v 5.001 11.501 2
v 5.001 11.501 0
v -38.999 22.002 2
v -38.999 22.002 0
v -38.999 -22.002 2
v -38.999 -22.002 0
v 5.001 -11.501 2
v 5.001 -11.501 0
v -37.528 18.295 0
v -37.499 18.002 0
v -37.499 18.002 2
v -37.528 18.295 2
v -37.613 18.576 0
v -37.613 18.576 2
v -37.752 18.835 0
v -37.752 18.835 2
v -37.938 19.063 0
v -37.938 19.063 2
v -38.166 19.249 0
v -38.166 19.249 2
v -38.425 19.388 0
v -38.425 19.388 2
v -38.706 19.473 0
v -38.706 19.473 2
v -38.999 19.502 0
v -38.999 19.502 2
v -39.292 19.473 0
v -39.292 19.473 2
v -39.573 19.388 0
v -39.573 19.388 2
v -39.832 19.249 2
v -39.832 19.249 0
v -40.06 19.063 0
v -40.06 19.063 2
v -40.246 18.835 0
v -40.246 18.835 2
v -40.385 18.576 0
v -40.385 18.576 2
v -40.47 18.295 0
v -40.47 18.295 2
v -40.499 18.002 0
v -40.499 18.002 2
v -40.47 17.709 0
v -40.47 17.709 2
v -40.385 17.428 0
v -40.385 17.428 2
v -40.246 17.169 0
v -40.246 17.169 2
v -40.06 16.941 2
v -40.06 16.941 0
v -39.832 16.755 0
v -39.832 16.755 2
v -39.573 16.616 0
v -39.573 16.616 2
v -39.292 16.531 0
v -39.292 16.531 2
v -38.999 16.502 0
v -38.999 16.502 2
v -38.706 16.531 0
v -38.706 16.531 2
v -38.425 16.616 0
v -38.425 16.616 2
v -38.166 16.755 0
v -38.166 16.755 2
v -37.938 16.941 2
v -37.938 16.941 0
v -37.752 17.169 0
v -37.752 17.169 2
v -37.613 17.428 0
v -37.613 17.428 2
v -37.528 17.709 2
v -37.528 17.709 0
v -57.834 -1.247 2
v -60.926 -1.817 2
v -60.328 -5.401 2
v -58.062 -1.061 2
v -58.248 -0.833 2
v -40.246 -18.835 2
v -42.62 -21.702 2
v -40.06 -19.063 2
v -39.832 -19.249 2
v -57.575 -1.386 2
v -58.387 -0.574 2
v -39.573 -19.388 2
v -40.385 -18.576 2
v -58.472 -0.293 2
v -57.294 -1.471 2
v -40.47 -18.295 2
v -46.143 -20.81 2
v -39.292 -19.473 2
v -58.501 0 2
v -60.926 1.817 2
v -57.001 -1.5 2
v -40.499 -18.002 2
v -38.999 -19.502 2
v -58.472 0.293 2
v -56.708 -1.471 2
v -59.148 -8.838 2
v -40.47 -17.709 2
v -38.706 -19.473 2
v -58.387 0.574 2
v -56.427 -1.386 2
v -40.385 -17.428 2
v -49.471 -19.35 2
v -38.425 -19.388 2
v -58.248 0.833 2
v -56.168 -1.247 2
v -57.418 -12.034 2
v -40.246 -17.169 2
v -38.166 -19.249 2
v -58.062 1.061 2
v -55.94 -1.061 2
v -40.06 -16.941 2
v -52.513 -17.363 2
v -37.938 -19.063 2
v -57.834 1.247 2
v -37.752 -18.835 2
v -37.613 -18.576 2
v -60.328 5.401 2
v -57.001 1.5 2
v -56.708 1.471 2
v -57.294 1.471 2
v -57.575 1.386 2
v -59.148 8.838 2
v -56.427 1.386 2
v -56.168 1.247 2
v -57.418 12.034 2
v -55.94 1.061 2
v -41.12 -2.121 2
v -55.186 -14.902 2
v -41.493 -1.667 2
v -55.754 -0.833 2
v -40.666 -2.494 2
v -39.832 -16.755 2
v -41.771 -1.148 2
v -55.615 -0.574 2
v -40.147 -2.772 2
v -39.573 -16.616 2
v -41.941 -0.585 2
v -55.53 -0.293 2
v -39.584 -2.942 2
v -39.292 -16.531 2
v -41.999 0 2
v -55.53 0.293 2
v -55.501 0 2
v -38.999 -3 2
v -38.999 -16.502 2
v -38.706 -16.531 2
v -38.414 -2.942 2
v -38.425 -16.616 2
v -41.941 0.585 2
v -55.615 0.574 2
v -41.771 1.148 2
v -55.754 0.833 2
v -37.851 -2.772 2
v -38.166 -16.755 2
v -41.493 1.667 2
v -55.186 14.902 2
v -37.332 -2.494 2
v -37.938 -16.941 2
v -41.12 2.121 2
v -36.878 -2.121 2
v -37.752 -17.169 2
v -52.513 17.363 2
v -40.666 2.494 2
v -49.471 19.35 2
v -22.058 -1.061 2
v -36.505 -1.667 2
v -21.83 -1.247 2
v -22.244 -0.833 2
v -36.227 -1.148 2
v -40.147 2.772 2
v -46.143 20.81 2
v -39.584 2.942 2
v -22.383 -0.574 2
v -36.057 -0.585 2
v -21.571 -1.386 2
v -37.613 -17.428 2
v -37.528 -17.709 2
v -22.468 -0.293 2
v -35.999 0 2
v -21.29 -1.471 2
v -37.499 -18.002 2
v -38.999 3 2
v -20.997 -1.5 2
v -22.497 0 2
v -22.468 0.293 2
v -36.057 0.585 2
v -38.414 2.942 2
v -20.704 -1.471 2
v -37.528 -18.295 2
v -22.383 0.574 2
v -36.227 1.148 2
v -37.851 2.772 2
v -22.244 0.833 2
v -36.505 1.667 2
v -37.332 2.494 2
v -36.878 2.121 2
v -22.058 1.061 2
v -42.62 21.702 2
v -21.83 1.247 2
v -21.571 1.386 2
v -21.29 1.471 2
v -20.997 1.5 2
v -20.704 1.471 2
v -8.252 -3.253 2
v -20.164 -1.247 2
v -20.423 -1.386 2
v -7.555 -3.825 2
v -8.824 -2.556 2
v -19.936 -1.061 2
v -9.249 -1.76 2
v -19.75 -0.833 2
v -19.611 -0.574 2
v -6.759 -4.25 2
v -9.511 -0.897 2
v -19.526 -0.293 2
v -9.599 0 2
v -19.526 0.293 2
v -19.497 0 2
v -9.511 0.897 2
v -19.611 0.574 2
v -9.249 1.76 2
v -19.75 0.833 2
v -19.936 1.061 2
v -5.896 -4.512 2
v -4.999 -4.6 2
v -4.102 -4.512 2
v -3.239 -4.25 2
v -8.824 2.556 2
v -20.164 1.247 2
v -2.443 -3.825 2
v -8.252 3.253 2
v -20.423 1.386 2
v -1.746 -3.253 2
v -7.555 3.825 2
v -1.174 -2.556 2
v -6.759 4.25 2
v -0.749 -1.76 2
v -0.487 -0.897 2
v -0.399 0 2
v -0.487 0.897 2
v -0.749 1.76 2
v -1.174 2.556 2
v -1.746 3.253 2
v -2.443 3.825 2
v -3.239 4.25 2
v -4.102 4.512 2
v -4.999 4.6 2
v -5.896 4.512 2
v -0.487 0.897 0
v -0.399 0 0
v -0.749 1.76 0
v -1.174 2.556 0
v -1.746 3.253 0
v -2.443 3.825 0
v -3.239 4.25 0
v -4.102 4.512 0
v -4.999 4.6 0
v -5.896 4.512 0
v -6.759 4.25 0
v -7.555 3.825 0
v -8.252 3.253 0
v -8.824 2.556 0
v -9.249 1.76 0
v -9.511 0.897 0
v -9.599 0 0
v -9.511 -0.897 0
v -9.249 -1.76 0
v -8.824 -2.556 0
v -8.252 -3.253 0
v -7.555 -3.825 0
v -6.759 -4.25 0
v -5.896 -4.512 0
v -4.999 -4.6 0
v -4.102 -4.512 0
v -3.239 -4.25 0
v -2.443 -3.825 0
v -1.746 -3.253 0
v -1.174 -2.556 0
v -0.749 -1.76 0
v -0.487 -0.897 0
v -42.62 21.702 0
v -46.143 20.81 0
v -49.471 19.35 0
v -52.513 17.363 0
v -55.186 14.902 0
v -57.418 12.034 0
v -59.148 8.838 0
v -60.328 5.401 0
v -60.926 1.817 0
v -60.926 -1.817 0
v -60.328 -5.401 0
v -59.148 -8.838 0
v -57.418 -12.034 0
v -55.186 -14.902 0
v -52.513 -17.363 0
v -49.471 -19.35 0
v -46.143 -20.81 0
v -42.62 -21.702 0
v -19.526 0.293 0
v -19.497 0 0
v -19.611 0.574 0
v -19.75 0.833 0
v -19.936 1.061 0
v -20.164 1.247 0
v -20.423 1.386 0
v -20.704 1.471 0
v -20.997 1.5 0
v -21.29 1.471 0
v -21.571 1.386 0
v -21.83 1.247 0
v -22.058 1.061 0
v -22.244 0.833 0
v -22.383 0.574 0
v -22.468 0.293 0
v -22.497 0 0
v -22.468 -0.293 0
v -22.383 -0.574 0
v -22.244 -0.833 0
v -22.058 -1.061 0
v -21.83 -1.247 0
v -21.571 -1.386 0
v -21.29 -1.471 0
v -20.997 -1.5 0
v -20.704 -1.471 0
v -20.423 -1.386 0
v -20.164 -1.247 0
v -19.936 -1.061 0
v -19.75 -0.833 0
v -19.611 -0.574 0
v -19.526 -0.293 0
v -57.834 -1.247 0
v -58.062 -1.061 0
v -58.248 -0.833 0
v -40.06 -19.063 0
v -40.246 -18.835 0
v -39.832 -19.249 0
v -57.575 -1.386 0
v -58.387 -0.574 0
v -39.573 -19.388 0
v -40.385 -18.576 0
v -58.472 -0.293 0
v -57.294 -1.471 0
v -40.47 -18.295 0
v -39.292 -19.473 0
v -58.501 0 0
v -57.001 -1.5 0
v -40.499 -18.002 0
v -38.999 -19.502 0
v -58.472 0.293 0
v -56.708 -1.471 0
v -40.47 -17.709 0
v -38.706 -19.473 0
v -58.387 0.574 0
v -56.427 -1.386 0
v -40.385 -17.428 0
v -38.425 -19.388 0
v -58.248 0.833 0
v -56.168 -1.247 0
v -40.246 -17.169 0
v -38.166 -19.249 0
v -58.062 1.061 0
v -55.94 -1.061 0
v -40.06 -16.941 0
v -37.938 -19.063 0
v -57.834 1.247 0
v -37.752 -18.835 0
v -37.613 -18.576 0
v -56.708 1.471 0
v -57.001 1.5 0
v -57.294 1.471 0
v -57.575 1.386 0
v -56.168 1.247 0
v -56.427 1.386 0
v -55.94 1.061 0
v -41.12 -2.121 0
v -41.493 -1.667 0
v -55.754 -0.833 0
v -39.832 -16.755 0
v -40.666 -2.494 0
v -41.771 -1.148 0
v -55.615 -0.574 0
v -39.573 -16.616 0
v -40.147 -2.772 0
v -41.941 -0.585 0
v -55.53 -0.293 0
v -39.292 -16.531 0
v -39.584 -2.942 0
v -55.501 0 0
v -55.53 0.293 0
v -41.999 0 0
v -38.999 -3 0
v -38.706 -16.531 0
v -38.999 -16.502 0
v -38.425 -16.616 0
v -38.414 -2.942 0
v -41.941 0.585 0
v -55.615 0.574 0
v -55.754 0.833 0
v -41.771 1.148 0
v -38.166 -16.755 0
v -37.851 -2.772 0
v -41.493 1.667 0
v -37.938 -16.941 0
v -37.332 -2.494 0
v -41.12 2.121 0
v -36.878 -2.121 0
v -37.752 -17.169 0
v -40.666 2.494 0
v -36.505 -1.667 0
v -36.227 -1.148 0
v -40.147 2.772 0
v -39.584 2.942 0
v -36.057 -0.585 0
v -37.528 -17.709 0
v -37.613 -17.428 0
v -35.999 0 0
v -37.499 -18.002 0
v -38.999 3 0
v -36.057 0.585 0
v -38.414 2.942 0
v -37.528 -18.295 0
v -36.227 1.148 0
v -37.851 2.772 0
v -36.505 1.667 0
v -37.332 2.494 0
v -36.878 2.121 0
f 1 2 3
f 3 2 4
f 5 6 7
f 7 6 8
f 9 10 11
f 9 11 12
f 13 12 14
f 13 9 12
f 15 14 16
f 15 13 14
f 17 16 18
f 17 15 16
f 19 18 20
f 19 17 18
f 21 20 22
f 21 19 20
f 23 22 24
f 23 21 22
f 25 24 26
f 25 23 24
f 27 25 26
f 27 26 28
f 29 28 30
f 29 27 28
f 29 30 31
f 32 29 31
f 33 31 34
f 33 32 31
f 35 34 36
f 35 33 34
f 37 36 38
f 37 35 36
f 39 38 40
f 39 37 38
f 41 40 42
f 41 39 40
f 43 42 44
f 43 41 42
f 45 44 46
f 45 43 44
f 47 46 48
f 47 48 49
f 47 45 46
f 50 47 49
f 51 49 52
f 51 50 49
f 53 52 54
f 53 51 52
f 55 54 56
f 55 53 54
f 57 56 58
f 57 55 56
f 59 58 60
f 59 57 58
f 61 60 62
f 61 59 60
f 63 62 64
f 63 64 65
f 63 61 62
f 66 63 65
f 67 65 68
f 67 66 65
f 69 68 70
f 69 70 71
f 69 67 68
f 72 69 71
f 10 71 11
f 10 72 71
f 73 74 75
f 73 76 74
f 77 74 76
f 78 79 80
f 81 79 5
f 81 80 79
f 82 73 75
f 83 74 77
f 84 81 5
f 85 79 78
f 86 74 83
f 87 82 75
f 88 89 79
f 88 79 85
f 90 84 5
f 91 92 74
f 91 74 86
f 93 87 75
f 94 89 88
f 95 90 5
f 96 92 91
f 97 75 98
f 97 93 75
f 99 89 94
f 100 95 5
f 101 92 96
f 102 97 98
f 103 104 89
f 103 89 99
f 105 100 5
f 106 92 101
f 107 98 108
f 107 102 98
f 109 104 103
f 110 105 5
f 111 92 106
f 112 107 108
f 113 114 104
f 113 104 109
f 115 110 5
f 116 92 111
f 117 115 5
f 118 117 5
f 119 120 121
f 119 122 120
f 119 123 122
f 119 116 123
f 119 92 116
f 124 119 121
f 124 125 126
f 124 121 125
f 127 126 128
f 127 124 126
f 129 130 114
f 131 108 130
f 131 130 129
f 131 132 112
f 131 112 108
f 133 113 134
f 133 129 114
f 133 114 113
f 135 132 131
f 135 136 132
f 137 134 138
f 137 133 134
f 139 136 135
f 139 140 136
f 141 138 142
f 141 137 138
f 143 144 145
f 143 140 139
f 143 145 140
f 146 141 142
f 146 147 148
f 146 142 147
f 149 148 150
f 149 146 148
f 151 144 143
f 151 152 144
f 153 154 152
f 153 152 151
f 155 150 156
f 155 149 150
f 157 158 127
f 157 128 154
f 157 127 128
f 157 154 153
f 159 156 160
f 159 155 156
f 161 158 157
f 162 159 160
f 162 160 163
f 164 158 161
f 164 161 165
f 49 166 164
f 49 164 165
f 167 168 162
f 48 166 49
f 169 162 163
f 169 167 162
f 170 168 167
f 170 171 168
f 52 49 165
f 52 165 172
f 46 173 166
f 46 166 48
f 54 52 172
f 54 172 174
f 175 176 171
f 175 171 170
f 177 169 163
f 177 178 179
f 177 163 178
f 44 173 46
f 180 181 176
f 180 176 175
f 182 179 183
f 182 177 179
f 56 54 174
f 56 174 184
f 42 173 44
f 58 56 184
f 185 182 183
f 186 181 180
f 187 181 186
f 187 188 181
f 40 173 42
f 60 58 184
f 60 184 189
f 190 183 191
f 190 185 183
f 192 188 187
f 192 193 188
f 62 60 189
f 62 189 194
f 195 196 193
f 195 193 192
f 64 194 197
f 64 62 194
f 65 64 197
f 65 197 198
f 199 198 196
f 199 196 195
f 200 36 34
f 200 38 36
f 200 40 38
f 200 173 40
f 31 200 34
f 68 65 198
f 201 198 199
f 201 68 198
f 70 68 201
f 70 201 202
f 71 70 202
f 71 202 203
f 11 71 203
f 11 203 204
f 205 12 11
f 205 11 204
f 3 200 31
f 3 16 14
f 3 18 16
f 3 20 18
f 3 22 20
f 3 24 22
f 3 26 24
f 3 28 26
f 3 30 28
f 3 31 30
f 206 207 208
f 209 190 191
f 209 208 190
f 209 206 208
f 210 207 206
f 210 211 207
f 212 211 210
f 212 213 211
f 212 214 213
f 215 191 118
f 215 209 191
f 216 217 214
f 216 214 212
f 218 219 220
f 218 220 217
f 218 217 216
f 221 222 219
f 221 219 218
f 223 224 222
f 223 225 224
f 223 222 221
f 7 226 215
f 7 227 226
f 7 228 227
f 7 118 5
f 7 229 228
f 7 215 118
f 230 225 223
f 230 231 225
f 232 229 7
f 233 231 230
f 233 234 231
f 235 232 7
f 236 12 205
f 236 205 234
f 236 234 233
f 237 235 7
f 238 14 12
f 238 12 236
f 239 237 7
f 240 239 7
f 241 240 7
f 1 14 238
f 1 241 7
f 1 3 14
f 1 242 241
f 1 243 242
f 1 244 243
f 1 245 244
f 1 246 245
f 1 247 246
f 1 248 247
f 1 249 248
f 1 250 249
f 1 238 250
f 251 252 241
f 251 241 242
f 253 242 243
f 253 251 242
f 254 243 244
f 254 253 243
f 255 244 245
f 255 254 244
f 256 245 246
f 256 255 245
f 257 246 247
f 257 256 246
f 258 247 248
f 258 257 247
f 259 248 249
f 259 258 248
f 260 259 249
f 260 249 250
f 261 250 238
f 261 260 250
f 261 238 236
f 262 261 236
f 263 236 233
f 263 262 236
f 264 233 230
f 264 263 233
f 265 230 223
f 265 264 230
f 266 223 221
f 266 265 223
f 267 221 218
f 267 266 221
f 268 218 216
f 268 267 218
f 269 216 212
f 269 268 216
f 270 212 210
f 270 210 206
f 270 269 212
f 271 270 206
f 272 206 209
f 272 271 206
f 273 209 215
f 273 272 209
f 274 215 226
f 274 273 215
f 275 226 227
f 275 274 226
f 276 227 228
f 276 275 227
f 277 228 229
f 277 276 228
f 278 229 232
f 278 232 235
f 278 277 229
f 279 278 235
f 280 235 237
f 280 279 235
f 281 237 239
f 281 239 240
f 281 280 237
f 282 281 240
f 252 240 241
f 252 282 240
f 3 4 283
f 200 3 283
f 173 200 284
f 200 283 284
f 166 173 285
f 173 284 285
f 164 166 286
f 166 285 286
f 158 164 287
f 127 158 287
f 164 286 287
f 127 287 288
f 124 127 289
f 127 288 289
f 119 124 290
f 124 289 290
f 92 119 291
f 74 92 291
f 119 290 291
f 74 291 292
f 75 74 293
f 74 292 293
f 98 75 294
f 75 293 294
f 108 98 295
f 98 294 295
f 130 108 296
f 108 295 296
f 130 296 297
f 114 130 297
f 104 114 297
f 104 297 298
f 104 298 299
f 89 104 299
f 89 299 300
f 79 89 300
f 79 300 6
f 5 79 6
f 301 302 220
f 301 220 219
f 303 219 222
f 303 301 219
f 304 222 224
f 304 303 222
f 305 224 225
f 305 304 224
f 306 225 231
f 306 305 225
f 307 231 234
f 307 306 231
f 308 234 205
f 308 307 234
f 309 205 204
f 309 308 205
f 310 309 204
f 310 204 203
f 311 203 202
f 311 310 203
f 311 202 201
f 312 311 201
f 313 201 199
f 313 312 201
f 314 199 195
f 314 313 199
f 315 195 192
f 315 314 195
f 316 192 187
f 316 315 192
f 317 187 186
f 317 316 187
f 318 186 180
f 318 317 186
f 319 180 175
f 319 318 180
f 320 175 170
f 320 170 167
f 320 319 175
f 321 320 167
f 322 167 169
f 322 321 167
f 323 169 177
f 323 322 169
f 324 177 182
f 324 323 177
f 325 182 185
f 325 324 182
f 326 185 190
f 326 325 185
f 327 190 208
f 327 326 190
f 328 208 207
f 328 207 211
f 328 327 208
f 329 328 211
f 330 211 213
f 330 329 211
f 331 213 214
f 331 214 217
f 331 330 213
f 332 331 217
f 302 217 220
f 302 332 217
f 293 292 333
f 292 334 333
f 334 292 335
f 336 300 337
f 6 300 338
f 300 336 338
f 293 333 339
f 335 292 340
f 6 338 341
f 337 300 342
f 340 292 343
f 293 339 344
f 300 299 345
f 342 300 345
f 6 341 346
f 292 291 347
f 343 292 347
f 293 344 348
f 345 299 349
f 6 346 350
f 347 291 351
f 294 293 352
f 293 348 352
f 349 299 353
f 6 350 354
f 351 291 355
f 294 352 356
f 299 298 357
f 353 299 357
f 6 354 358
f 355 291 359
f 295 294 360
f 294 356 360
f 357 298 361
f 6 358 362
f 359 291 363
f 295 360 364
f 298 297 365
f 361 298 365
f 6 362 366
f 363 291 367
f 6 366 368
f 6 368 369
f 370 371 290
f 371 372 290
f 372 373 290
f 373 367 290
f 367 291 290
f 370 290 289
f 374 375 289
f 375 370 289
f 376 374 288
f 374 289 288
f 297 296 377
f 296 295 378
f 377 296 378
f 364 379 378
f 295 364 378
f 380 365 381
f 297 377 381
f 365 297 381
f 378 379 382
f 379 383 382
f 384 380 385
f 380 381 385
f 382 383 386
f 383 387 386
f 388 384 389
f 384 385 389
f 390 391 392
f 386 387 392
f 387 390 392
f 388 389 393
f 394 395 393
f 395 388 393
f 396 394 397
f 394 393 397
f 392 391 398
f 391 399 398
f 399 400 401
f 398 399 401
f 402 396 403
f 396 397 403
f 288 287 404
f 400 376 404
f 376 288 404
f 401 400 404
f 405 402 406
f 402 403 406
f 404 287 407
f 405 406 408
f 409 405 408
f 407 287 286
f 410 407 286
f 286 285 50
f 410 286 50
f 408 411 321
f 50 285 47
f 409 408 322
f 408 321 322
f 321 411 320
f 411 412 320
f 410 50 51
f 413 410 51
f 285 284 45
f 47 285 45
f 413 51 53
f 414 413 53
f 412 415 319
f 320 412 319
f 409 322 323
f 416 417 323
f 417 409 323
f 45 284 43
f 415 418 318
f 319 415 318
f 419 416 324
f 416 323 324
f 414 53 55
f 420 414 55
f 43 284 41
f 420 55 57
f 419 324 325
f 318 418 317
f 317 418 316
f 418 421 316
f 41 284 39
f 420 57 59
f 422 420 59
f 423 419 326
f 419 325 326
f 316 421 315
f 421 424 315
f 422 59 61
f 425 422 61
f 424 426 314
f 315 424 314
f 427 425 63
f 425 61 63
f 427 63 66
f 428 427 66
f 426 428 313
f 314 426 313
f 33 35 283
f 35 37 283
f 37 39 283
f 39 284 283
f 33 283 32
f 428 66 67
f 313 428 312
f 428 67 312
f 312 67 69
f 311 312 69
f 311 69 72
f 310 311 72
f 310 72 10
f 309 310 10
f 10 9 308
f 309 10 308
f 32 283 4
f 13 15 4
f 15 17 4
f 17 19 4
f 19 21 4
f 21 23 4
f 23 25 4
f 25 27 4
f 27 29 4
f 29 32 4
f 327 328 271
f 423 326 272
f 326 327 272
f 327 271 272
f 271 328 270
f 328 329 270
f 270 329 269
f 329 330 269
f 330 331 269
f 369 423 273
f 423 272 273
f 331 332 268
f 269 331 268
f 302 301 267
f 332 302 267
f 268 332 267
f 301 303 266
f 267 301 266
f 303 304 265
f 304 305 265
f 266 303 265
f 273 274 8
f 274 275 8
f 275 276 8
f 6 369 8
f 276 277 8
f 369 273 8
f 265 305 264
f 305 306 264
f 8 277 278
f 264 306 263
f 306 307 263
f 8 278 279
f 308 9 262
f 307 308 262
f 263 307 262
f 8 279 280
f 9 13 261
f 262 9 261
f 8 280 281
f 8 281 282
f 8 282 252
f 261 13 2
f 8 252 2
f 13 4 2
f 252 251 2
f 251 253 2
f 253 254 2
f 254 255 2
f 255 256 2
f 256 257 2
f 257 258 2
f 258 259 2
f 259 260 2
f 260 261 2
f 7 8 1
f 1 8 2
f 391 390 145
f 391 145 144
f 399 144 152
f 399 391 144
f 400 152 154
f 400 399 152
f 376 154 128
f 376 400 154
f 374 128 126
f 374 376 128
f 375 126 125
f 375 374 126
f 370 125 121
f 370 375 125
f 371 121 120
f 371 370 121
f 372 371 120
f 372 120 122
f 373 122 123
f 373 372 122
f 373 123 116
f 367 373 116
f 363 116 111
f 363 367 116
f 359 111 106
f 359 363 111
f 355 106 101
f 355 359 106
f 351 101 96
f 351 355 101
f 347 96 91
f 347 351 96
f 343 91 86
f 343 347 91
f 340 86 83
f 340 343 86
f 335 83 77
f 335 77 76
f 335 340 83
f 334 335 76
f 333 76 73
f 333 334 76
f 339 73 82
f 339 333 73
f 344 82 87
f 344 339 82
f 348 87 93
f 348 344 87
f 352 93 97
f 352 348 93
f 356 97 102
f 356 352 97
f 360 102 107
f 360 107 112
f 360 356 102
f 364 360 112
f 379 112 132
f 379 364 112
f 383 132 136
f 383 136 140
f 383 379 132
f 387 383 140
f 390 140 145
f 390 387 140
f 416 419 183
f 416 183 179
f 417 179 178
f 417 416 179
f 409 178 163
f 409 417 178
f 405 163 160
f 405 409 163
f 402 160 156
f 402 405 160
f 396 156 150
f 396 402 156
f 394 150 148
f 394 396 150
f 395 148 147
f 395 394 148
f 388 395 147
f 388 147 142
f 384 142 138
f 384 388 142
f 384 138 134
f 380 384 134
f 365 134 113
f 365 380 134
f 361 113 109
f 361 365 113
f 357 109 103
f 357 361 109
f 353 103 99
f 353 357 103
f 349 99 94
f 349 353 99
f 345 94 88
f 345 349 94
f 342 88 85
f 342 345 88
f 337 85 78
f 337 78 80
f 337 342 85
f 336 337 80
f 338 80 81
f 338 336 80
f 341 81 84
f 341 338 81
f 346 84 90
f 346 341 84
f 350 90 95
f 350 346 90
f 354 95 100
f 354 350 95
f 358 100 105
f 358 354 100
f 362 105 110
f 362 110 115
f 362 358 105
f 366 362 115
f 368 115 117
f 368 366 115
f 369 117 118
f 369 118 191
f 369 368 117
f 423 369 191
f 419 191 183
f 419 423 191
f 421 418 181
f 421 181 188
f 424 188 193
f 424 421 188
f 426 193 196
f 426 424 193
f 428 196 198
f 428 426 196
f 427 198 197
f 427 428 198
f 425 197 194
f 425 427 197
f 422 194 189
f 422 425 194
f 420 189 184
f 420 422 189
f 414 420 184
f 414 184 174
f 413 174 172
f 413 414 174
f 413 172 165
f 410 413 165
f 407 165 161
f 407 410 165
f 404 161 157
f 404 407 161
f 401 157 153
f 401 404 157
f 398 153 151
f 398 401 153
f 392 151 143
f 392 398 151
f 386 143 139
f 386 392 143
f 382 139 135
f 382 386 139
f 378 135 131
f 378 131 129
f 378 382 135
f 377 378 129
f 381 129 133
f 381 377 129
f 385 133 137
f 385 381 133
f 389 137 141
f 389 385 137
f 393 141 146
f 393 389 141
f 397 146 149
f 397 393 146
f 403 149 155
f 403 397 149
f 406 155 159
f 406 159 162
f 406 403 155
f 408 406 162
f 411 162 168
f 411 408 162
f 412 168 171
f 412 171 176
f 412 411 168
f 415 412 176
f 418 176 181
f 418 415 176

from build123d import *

# Parameters (mm, degrees)
SKETCH_1_R      = 1.5
SKETCH_1_R_2    = 3
SKETCH_1_R_3    = 4.6
EXTRUDE_1_DEPTH = 2


with BuildPart() as part:
    # 草图1 → 凸台-拉伸1 (new body)
    with BuildSketch(Plane.XY):
        with BuildLine():
            Line((5.001004832, -11.501004832), (5.001004832, 11.501004832))
            Line((5.001004832, 11.501004832), (-38.998995168, 22.002009663))
            ThreePointArc((-38.998995168, 22.002009663), (-61.001004832, 0), (-38.998995168, -22.002009663))
            Line((-38.998995168, -22.002009663), (5.001004832, -11.501004832))
        make_face()
        with Locations((-38.998995168, -18.002009663)):
            Circle(SKETCH_1_R, mode=Mode.SUBTRACT)
        with Locations((-57.001004832, 0)):
            Circle(SKETCH_1_R, mode=Mode.SUBTRACT)
        with Locations((-38.998995168, 0)):
            Circle(SKETCH_1_R_2, mode=Mode.SUBTRACT)
        with Locations((-38.998995168, 18.002009663)):
            Circle(SKETCH_1_R, mode=Mode.SUBTRACT)
        with Locations((-20.996985505, 0)):
            Circle(SKETCH_1_R, mode=Mode.SUBTRACT)
        with Locations((-4.998995168, 0)):
            Circle(SKETCH_1_R_3, mode=Mode.SUBTRACT)
    extrude(amount=EXTRUDE_1_DEPTH)


solid = part.part
